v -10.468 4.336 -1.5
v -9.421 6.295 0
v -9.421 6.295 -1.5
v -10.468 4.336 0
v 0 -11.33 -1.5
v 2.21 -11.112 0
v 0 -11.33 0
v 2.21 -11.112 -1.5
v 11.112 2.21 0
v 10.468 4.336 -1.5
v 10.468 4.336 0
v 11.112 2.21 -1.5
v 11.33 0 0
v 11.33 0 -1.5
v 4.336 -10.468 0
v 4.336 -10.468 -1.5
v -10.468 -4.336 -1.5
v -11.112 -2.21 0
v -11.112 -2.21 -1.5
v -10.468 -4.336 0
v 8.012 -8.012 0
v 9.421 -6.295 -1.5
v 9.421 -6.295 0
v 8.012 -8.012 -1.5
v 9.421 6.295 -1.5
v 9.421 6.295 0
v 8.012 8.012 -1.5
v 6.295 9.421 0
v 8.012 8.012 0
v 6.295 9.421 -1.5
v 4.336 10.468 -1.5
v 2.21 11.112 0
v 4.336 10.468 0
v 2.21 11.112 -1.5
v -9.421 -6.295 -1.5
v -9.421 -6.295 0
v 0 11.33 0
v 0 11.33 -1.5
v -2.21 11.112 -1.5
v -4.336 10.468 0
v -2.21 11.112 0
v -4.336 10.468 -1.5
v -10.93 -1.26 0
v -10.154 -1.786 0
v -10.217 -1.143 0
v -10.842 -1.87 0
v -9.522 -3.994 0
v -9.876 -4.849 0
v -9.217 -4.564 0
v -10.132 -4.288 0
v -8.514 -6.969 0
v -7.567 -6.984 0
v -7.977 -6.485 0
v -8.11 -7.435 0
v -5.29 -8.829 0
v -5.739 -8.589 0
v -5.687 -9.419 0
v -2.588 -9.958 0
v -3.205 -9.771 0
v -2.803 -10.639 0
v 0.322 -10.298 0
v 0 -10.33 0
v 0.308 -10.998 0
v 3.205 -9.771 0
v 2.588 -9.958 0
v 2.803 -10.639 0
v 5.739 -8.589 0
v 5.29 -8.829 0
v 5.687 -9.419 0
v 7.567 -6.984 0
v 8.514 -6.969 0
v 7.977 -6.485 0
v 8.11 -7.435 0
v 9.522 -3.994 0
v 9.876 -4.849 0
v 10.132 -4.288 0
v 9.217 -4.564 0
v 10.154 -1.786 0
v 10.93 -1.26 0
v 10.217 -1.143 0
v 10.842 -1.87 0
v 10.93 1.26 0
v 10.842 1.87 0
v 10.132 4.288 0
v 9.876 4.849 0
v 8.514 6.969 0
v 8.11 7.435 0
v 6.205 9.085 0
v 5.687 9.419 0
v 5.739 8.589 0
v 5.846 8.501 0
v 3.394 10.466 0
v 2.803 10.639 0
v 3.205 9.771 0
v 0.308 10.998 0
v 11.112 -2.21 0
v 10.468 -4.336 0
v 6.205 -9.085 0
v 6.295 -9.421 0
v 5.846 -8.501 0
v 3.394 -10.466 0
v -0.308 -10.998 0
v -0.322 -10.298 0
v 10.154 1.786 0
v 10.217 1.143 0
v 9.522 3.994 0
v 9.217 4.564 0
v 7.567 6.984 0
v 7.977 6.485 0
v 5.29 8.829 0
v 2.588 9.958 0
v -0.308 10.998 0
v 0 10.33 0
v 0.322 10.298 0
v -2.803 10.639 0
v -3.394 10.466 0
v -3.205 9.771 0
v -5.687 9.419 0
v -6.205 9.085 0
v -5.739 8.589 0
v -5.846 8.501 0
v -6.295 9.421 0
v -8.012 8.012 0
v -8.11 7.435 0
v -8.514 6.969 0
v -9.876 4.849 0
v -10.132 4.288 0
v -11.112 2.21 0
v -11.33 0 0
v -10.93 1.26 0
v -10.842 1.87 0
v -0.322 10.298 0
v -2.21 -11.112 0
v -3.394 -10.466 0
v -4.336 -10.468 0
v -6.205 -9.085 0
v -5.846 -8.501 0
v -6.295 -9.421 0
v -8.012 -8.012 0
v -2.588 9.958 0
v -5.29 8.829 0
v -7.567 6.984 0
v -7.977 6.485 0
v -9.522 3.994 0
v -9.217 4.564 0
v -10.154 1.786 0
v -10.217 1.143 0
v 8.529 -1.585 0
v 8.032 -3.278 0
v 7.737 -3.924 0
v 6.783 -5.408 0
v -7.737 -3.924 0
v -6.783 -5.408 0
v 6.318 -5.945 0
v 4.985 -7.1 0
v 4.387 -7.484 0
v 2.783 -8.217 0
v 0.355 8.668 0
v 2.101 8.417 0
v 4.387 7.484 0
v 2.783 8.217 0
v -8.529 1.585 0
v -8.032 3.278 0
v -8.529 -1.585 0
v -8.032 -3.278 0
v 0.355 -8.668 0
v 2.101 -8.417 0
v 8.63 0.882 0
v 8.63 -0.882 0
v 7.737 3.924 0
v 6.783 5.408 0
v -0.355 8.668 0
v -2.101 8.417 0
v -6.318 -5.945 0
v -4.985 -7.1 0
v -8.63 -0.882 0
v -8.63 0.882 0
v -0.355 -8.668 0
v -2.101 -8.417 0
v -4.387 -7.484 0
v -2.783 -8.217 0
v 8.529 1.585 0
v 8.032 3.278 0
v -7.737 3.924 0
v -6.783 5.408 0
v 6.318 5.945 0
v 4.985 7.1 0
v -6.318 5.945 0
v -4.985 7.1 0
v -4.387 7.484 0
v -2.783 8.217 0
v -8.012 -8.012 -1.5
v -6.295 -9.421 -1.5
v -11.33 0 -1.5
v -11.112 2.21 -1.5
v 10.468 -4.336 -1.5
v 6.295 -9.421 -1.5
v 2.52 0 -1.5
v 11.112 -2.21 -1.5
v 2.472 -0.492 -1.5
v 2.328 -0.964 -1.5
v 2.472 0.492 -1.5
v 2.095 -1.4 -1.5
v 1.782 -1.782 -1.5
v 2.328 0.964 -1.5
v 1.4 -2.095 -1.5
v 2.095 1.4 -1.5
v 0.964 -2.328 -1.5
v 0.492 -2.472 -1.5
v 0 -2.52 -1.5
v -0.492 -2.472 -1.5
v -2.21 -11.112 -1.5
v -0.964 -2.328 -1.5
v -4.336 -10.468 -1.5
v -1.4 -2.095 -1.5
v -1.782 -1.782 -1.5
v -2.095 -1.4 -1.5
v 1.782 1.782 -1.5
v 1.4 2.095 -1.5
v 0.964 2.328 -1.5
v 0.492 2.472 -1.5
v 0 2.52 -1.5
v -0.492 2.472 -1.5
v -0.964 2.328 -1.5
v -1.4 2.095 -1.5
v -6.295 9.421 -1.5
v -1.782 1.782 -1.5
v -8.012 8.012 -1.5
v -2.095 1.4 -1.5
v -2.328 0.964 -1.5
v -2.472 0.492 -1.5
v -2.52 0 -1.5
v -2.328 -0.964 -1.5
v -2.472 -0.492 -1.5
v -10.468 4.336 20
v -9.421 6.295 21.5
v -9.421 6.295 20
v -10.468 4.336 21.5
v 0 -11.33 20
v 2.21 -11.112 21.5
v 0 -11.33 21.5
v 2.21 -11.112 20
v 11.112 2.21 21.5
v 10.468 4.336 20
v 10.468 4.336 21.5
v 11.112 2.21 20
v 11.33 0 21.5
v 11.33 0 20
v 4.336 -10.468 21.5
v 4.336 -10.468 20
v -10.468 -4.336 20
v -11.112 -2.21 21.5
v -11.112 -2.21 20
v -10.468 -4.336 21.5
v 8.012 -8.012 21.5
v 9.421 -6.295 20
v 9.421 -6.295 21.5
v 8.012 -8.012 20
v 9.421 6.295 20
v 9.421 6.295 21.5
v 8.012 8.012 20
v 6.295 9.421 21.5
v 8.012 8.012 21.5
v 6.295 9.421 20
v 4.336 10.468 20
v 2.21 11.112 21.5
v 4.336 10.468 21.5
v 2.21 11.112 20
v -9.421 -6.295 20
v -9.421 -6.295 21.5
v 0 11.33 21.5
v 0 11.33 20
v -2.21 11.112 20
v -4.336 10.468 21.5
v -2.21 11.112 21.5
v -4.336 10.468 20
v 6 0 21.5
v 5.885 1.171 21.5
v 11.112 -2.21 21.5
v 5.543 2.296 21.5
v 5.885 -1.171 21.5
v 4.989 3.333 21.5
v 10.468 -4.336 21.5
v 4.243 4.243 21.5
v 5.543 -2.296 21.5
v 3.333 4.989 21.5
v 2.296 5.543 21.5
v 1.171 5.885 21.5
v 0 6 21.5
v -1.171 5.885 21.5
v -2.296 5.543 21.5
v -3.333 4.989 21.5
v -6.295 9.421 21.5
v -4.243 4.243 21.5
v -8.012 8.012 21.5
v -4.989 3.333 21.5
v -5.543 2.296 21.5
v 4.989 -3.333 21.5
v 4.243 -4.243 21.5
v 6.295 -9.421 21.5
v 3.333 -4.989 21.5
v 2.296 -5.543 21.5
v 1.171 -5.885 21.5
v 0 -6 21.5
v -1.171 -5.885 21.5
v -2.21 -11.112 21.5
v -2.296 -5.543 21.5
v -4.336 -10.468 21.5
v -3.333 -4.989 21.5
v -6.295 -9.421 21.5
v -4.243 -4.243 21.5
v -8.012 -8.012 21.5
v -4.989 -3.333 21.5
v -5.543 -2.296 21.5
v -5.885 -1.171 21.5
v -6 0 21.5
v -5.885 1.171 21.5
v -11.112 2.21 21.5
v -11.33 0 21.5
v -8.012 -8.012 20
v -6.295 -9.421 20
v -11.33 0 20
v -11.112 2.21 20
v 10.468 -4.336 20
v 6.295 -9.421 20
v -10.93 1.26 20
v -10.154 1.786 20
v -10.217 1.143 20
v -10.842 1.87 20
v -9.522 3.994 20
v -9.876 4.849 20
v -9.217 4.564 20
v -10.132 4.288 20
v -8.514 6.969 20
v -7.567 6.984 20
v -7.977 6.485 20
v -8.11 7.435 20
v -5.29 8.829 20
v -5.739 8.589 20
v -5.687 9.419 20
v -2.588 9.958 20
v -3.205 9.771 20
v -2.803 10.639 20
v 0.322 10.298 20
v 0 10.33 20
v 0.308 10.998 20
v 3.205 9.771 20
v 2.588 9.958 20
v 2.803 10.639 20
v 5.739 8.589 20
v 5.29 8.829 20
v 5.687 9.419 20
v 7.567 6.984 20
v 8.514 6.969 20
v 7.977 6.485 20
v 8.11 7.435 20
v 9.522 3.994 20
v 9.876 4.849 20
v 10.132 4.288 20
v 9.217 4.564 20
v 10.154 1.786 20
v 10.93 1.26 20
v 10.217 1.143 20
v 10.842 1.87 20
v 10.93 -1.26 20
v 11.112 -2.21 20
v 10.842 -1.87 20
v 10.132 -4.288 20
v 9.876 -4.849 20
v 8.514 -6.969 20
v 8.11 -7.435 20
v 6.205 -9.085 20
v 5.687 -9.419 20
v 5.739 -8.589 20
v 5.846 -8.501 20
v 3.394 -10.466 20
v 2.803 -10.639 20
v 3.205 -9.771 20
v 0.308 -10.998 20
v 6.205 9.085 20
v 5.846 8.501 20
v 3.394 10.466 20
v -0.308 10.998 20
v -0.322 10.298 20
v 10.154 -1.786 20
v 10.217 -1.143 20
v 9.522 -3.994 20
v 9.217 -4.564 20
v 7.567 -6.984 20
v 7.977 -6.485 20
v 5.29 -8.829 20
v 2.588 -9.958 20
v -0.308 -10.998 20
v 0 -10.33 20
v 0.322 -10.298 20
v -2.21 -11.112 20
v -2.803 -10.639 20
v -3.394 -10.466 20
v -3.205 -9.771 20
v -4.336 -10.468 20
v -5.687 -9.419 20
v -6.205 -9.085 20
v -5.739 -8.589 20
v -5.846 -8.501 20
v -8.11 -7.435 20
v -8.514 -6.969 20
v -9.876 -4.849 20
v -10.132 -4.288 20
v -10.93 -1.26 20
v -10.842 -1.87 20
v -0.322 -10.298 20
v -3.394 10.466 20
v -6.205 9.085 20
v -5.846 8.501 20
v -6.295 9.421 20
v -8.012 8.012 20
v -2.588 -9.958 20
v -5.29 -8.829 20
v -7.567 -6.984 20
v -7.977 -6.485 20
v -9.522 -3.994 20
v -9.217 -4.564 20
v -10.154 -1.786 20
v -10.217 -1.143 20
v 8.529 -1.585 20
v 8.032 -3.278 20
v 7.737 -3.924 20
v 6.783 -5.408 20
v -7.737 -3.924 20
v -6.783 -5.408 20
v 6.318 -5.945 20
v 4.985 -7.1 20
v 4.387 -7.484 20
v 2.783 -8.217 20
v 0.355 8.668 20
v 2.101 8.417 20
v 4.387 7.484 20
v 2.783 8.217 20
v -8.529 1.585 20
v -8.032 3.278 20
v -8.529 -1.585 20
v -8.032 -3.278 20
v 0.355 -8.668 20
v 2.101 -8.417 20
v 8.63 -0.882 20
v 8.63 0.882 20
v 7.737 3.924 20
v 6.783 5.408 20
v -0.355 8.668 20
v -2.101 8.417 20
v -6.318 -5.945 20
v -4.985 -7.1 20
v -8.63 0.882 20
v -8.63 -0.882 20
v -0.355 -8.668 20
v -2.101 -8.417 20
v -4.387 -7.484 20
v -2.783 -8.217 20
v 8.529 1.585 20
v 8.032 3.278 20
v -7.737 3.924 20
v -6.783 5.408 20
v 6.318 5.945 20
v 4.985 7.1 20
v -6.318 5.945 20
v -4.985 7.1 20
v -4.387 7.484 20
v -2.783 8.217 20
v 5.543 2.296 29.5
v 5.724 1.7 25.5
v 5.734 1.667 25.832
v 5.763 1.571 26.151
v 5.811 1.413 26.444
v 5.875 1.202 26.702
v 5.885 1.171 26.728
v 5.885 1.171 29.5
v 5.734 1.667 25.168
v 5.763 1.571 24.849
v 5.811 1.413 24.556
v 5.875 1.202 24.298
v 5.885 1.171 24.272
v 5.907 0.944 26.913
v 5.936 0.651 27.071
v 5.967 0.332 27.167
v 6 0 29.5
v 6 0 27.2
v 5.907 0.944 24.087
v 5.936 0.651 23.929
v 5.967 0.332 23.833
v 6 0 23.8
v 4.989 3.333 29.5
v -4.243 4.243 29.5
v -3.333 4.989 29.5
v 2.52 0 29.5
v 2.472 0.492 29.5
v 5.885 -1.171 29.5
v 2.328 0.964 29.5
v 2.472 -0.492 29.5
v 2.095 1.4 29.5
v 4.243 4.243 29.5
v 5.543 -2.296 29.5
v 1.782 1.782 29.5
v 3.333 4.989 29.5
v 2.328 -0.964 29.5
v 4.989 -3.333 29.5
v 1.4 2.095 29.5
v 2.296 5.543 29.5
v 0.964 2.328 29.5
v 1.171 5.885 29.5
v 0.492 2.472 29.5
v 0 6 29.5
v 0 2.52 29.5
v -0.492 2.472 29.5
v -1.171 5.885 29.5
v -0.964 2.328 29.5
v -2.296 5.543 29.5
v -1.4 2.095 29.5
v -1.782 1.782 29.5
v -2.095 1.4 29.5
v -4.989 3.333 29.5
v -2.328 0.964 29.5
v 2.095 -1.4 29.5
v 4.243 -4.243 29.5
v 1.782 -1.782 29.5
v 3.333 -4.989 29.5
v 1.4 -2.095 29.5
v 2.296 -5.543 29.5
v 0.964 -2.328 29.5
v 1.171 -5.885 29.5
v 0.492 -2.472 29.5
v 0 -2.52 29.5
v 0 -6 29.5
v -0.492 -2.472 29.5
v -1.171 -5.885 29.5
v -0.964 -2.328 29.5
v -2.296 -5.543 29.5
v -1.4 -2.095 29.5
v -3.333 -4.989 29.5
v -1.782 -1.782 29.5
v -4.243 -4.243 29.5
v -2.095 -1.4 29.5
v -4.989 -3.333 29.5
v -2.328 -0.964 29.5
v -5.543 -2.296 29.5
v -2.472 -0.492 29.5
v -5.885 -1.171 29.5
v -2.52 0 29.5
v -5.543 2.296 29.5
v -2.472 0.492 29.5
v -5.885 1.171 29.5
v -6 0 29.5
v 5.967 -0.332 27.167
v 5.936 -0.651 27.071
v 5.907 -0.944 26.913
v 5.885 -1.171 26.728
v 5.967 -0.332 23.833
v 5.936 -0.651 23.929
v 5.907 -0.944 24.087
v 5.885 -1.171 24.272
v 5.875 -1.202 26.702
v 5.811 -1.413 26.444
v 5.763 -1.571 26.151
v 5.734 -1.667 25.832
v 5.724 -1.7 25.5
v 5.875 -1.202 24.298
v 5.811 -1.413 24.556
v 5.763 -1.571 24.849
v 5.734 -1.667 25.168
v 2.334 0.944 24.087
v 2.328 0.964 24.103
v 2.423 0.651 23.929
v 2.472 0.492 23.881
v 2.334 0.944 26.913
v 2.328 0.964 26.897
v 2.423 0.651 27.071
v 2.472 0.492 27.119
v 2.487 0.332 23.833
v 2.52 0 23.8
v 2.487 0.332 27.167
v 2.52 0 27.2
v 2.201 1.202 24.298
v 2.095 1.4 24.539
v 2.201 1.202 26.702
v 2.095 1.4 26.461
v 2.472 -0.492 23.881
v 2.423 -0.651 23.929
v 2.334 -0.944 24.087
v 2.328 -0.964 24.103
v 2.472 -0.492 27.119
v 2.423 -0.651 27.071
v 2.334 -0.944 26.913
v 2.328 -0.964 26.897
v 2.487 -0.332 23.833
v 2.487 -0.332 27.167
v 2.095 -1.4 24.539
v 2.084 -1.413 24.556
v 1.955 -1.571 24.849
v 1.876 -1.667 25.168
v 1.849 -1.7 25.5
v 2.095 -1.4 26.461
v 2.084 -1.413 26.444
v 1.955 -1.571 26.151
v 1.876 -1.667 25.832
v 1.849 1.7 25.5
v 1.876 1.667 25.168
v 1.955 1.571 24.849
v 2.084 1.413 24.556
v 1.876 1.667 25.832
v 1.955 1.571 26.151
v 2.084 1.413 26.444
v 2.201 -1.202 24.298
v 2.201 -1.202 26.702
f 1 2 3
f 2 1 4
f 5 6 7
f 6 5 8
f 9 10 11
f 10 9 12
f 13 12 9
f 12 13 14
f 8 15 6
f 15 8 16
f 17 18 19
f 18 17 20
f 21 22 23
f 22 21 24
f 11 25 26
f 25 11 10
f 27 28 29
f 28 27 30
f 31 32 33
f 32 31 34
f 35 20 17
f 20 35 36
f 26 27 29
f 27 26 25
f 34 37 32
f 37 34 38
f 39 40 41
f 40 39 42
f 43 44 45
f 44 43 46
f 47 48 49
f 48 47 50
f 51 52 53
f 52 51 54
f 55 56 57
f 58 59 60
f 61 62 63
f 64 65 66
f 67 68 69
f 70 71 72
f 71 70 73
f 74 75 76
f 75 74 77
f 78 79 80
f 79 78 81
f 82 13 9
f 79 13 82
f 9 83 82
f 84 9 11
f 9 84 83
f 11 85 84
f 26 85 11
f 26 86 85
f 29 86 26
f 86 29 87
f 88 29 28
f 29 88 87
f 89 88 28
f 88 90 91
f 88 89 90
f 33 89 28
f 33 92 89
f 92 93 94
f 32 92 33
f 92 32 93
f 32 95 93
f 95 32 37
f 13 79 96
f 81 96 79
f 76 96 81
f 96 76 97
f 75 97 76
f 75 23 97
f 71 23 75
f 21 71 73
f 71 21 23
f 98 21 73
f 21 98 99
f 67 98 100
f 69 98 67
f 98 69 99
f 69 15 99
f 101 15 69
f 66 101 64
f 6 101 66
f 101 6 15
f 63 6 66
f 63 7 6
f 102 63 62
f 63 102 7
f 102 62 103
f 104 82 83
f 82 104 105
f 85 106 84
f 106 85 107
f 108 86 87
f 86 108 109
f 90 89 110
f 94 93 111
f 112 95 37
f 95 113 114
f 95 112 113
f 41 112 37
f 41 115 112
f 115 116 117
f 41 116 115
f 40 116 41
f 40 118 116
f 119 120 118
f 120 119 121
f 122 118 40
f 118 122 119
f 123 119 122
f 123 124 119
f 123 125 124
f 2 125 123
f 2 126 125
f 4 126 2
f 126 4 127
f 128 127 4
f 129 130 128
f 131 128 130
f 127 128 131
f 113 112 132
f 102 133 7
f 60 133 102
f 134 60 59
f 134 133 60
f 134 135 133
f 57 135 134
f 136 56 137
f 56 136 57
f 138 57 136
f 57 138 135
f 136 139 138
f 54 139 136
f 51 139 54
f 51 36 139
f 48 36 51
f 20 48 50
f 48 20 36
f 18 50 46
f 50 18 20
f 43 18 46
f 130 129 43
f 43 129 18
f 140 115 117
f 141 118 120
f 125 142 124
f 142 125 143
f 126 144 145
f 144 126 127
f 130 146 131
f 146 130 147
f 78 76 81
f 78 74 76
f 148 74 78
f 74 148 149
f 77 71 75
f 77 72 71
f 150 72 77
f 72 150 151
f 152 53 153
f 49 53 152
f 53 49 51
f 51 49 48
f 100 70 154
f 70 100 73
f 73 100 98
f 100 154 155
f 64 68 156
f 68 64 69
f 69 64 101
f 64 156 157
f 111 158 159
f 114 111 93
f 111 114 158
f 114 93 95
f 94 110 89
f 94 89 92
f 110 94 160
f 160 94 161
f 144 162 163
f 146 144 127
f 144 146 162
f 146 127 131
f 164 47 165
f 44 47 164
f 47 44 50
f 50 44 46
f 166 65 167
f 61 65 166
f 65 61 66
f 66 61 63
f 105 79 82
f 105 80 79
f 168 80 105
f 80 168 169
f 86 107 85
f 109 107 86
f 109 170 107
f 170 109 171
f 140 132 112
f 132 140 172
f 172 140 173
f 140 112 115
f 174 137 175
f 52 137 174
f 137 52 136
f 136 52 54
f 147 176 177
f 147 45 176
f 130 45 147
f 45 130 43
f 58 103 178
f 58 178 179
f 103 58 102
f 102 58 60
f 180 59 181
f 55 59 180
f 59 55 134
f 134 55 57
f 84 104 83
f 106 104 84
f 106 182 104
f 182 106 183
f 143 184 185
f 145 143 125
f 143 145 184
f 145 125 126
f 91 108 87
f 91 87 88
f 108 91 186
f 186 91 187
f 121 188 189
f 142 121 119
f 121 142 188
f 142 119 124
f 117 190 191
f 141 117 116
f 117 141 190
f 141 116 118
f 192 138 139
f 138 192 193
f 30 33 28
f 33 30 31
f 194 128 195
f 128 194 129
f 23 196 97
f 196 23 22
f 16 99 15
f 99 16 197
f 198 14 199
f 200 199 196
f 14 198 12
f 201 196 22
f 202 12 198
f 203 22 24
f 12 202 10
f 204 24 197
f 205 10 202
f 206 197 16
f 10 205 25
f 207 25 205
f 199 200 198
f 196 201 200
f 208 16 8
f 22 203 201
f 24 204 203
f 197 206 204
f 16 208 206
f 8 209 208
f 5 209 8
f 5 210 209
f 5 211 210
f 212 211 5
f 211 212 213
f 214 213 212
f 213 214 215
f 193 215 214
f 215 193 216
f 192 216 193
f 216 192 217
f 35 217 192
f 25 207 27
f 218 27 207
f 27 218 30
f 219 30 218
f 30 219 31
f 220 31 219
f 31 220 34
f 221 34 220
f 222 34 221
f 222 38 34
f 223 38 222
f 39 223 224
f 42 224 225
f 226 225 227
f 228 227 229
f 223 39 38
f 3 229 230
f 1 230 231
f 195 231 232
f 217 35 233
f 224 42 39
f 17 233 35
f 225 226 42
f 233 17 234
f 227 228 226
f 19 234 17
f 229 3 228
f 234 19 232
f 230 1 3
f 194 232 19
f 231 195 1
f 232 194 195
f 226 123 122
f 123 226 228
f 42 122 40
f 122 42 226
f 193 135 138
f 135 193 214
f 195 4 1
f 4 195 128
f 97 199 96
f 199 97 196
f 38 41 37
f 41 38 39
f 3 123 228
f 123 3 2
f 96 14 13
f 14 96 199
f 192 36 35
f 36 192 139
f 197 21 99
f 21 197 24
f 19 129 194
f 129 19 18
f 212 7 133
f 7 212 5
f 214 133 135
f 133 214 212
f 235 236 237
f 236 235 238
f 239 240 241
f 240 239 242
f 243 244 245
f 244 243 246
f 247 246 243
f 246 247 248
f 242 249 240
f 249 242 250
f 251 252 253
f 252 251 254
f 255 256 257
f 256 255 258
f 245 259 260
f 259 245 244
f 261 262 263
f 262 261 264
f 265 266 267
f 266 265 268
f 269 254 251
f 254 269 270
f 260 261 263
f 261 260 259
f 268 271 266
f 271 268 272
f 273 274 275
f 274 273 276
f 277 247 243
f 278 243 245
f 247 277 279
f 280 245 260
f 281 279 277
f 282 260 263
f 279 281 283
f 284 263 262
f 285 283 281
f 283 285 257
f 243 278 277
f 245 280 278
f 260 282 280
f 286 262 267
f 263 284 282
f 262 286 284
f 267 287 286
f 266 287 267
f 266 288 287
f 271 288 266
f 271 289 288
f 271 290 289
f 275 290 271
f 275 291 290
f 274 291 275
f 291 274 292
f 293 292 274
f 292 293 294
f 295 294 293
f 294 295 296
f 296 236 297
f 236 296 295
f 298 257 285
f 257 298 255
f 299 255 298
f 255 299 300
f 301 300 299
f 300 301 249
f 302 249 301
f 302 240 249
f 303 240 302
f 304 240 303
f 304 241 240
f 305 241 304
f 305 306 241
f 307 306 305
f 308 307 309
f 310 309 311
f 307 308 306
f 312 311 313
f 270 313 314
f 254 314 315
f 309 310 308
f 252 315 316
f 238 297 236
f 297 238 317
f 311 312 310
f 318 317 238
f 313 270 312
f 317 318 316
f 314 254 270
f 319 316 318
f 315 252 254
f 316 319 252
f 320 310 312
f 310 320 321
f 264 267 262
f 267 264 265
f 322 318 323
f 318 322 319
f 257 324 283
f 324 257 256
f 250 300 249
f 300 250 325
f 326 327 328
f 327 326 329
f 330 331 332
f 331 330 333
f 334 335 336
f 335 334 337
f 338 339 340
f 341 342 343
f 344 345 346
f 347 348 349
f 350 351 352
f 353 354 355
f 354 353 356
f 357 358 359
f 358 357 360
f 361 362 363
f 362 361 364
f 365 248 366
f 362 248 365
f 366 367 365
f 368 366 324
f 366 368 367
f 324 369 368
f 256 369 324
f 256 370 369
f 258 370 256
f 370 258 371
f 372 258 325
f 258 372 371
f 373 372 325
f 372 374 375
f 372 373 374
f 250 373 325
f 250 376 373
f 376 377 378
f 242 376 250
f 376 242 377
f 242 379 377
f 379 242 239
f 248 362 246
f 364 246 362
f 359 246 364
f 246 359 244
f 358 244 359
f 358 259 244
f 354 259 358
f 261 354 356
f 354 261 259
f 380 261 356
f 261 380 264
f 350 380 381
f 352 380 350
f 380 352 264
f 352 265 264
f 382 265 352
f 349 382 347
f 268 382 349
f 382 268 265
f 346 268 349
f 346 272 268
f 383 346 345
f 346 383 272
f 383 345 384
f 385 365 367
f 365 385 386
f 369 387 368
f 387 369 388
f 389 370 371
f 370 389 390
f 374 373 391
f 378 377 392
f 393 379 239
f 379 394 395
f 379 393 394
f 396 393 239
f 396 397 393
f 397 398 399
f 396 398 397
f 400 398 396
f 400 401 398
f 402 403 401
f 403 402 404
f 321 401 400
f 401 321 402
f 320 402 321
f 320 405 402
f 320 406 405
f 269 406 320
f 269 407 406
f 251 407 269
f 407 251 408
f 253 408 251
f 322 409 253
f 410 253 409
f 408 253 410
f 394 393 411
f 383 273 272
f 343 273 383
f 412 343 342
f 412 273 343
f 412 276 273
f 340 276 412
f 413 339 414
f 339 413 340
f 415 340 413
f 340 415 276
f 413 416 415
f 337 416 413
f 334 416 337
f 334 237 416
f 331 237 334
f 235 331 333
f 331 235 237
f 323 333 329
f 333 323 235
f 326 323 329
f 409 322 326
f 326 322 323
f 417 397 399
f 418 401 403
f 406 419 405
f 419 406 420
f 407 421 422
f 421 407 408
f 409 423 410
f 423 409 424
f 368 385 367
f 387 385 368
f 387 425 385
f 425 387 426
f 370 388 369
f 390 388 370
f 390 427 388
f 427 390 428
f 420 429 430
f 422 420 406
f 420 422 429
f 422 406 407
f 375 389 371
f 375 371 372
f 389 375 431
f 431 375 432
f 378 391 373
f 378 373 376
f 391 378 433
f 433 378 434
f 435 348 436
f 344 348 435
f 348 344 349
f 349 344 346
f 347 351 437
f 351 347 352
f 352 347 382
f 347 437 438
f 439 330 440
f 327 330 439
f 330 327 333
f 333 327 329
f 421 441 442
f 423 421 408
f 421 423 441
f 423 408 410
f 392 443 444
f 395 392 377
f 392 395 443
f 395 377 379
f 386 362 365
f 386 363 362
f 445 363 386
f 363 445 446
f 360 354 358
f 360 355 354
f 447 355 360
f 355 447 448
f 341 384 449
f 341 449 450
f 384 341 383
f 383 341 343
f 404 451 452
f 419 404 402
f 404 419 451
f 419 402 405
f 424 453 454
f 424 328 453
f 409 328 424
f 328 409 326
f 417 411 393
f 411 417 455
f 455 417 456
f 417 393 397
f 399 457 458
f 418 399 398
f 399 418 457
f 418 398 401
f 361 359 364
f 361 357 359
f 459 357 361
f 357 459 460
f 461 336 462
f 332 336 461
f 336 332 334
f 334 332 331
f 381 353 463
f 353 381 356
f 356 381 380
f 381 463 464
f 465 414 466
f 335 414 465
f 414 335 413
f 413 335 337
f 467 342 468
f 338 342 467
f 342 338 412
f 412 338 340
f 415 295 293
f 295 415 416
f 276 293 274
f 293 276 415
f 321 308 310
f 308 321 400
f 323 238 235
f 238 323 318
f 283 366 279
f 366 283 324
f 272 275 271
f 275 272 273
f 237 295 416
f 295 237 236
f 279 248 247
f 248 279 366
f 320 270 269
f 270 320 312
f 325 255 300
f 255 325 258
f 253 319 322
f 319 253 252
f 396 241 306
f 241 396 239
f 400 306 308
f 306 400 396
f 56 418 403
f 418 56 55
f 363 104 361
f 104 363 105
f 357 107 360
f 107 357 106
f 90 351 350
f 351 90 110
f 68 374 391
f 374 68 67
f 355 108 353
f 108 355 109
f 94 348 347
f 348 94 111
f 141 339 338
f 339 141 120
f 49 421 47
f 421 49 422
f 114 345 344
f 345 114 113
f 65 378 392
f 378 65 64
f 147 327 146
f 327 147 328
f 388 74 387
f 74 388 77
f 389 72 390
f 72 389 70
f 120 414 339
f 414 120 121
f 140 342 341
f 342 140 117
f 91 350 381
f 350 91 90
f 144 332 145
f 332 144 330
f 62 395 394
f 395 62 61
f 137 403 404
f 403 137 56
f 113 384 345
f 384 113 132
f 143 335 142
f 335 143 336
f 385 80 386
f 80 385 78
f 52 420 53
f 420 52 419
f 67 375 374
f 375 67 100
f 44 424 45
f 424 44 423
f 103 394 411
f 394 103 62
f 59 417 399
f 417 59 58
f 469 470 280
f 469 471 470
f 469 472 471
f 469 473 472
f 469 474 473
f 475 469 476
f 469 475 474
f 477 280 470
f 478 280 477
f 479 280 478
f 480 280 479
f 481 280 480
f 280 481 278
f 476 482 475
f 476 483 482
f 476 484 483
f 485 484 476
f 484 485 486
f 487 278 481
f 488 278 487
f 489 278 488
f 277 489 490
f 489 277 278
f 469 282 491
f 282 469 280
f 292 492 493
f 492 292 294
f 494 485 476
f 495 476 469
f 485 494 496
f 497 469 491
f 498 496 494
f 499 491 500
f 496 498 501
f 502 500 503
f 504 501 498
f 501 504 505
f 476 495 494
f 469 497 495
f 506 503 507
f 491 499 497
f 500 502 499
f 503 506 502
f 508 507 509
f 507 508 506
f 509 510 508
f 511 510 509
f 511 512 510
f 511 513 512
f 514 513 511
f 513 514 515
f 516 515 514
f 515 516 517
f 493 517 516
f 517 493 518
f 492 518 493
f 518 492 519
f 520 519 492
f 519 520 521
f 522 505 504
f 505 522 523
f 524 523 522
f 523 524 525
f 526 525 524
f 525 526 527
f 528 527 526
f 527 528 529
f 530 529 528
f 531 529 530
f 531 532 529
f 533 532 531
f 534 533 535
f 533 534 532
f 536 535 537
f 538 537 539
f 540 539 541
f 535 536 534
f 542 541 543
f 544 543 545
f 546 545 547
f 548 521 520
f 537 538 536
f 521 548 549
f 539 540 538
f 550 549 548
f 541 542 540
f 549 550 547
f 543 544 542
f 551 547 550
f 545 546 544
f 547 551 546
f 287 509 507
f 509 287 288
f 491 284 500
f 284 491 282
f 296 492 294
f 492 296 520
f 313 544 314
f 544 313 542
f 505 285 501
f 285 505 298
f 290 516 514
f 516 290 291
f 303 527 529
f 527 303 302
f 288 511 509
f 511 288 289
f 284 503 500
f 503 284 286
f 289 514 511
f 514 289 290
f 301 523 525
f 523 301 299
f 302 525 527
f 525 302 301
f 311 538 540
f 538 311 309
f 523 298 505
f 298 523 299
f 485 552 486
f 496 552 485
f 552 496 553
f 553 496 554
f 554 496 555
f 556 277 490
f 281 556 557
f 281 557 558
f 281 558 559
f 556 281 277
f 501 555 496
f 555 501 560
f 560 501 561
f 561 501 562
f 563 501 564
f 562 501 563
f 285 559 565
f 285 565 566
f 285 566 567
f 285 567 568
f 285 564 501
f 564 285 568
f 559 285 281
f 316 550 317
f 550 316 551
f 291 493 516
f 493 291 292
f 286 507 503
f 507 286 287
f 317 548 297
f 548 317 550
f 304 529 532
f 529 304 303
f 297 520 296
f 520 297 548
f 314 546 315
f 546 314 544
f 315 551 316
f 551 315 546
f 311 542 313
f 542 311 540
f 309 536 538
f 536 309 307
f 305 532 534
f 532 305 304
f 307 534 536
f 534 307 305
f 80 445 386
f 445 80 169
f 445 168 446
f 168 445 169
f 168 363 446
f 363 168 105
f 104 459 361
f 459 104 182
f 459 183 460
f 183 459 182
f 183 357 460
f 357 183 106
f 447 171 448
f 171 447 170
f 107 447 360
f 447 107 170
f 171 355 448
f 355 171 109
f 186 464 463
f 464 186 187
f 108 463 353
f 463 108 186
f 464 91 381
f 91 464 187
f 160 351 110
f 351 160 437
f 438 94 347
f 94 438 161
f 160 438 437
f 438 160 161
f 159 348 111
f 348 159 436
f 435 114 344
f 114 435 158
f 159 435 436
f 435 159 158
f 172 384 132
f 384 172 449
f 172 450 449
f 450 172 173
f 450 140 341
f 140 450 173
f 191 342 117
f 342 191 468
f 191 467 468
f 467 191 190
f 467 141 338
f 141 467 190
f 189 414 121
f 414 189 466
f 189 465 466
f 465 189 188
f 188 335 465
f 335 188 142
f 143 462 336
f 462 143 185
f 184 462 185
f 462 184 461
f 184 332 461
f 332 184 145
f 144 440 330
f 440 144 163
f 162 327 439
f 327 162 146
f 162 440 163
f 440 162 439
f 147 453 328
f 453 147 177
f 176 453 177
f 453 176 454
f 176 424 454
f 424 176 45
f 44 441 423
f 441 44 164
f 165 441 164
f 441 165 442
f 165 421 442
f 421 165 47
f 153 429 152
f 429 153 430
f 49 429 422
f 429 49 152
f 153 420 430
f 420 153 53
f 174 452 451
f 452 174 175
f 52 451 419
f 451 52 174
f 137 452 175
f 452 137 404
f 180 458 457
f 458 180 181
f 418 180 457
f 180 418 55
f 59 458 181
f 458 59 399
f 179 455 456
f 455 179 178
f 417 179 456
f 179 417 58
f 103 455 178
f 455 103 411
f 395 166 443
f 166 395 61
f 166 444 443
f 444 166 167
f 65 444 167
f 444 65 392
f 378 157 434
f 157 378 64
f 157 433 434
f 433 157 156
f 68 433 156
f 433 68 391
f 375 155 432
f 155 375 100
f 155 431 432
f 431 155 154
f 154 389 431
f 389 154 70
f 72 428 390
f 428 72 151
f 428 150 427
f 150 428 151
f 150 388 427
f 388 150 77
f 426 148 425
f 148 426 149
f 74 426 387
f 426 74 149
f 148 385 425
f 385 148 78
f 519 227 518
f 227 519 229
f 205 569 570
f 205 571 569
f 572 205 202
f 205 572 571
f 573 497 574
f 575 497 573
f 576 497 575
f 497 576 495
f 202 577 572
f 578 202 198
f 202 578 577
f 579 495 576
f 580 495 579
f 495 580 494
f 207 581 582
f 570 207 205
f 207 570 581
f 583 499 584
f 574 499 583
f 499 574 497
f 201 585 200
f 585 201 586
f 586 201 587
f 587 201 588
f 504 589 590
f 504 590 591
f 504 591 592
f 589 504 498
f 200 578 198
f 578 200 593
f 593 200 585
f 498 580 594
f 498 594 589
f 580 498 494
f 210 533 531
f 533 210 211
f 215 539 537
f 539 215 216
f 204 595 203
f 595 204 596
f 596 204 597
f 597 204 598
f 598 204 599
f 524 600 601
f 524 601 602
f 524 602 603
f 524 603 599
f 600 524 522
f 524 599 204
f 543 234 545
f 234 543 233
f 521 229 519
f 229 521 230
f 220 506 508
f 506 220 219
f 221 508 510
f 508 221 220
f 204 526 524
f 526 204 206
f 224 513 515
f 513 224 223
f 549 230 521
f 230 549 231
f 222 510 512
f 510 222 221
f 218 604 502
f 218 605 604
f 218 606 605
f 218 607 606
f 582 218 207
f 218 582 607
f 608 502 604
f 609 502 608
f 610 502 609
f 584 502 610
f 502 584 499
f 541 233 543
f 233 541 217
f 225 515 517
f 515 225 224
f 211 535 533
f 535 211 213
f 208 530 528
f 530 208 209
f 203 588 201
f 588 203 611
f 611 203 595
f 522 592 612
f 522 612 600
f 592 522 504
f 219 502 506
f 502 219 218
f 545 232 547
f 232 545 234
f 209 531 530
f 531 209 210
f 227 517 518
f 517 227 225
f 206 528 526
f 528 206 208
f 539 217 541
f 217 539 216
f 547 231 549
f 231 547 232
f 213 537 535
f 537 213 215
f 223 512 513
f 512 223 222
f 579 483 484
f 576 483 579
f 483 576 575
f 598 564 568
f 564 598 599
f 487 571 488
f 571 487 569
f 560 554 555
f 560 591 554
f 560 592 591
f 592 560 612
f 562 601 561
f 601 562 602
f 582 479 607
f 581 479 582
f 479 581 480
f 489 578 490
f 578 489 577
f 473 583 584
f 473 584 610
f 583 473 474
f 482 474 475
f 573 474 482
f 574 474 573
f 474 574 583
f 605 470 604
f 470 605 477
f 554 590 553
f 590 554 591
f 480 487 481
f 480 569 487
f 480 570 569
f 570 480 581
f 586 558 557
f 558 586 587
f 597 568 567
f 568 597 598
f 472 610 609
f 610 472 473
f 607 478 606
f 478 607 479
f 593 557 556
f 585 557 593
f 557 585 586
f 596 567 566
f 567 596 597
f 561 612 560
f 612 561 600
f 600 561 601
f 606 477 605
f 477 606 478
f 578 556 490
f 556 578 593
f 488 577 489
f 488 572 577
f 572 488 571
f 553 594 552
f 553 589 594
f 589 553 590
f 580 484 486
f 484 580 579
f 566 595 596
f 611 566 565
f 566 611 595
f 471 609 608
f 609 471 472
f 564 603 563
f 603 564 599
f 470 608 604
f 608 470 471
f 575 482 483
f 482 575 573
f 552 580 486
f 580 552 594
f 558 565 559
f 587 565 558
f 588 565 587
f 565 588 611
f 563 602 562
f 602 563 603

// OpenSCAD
$fn = 32;

// ----------------------------------------------------------------------
// Timing pulley: GT3 22T, pitch 3 mm, 22.66 mm x 31 mm
// ----------------------------------------------------------------------

// --- parameters (mm) ---
pitch_mm = 3;             // belt pitch
tooth_count = 22;         // number of grooves
width = 20;               // belt width between the flanges
tip_d = 20.66;            // tip circle diameter
root_d = 18.46;           // groove bottom diameter
groove_h = 1.1;           // groove depth
tooth_w = 2.1;            // groove width at the tip circle
side_d = 22.66;           // flange diameter
side_t = 1.5;             // flange thickness
spigot_d = 16.86;         // flange spigot, sunk into the rim
spigot_h = 1.2;           // spigot depth into the rim
hub_bore = 5.04;          // shaft bore
hub_d = 12;               // hub diameter
hub_h = 8;                // hub above the flange
bottom_z = -1.5;          // lowest point of the pulley
top_z = 29.5;             // highest point of the pulley
set_d = 3.4;              // set screw tap hole

module rim() {
  cylinder(h = width, d = tip_d);
}

module groove_cutter() {
  /* belt tooth groove: deeper than wide, cut through the belt width */
  translate([root_d / 2, 0, 0])
    linear_extrude(height = width)
      polygon(points = [[-0.6, -tooth_w * 0.42], [groove_h + 0.6, -tooth_w * 0.6],
                        [groove_h + 0.6, tooth_w * 0.6], [-0.6, tooth_w * 0.42]]);
}

module flanges() {
  translate([0, 0, -side_t]) cylinder(h = side_t, d = side_d);
  translate([0, 0, width]) cylinder(h = side_t, d = side_d);
  translate([0, 0, -spigot_h]) cylinder(h = spigot_h + 0.6, d = spigot_d);
  translate([0, 0, width - 0.6]) cylinder(h = spigot_h + 0.6, d = spigot_d);
}

module hub() {
  translate([0, 0, bottom_z]) cylinder(h = top_z - bottom_z, d = hub_d);
}

difference() {
  union() {
    rim();
    hub();
    flanges();
  }
  for (i = [0 : tooth_count - 1]) rotate([0, 0, i * 360 / tooth_count]) groove_cutter();
  translate([0, 0, bottom_z - 1]) cylinder(h = top_z - bottom_z + 2, d = hub_bore);
  translate([-1, 0, top_z - hub_h * 0.5]) rotate([0, 90, 0]) cylinder(h = hub_d / 2 + 3, d = set_d);
}
